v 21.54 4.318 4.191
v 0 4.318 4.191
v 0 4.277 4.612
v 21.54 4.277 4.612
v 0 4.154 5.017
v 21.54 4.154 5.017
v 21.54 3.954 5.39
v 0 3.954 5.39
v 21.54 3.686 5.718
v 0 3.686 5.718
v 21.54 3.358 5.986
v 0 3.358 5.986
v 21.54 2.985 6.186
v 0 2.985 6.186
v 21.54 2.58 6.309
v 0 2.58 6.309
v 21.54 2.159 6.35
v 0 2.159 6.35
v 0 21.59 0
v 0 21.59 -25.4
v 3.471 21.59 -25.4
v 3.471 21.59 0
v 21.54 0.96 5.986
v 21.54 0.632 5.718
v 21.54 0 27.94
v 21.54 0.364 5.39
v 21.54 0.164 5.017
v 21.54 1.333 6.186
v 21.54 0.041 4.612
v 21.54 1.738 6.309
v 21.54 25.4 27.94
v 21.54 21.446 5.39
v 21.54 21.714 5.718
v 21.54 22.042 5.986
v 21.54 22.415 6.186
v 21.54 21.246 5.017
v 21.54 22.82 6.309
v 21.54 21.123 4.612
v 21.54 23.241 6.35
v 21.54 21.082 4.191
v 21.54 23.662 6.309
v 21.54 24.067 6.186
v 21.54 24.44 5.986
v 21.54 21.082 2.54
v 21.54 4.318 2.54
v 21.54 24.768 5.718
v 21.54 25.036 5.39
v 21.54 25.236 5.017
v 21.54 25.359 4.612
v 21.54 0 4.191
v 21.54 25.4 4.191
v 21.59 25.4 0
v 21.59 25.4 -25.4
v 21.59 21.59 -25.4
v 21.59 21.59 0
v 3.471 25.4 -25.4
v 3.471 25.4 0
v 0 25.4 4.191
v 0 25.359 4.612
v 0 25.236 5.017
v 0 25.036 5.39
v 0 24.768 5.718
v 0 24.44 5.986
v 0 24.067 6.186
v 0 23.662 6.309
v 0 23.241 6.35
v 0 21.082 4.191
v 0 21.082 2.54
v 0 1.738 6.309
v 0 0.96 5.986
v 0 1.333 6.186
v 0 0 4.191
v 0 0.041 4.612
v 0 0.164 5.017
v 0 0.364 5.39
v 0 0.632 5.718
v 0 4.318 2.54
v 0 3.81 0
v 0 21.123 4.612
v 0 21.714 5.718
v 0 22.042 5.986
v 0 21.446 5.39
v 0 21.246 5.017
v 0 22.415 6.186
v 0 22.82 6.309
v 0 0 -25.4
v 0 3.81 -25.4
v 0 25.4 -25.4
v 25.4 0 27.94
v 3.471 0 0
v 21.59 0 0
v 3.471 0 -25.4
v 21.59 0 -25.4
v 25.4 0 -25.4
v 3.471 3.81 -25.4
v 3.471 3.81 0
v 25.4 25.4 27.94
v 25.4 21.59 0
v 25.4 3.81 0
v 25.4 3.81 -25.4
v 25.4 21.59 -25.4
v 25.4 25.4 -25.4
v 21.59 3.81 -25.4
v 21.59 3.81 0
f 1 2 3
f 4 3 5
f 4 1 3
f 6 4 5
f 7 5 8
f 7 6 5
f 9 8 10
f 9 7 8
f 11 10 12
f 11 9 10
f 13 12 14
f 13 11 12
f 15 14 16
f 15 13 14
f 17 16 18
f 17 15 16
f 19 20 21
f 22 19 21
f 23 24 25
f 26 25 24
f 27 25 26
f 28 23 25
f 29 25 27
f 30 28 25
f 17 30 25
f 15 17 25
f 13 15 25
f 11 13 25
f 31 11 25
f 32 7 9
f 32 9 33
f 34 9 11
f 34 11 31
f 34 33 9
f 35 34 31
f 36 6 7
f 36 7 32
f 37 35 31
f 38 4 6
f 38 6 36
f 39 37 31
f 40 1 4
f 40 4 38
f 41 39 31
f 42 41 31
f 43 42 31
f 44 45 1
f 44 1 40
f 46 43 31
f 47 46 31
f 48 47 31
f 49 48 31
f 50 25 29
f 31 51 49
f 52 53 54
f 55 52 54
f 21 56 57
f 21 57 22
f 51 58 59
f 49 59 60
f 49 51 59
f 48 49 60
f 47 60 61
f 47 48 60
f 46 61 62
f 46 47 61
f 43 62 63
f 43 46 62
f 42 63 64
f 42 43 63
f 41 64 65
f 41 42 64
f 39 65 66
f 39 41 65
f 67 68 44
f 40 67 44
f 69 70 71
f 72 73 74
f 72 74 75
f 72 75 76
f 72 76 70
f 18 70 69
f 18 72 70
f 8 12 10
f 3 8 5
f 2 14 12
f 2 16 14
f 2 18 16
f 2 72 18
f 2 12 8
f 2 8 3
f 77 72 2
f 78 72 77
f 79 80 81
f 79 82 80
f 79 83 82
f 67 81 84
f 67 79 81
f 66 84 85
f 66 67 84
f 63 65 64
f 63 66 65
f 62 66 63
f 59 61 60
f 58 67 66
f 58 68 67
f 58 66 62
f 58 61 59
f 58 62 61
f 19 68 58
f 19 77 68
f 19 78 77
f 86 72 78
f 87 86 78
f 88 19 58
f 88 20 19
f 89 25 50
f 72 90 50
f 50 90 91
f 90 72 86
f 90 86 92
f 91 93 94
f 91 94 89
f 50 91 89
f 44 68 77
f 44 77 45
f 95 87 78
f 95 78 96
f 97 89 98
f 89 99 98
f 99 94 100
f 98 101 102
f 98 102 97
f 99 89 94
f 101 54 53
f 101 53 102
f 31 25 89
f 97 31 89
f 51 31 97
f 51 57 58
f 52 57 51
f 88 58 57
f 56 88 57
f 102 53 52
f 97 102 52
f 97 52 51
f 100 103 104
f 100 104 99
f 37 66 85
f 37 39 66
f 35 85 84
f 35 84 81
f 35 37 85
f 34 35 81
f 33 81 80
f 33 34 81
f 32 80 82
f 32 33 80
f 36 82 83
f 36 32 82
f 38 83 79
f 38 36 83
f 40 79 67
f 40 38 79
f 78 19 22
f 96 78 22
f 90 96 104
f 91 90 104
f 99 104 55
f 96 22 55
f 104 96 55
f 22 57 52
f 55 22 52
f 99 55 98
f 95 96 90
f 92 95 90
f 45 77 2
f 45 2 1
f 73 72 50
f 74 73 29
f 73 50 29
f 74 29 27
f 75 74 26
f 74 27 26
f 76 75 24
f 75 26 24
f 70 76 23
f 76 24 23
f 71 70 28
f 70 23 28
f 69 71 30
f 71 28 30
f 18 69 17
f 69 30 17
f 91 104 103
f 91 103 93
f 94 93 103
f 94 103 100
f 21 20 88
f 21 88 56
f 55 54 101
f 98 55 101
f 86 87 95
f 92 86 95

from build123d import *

# Parameters (mm, degrees)
F0_W      = 25.4
F0_H      = 25.4
F1_DEPTH  = 2.54
F2_W      = 3.4710424952
F2_H      = 3.81
F2_W_2    = 3.81
F3_DEPTH  = 25.4
F4_W      = 3.8600380808
F4_H      = 25.4
F5_DEPTH  = 25.4
F6_W      = 21.5399619192
F6_H      = 4.318
F7_DEPTH  = 3.81
F8_R      = 2.15899
F9_W      = 21.5399619192
F9_H      = 4.318
F10_DEPTH = 3.81
F11_R     = 2.159
F12_R     = 2.15899


# Not quite as in the source:
# - a fillet or chamfer is up to 0.001 mm smaller than in the source, because OpenCascade refuses the exact size


with BuildPart() as f1:
    # F0 (on Top) → F1 (new body)
    with BuildSketch(Plane.XY):
        with Locations((12.7, 12.7)):
            Rectangle(F0_W, F0_H)
    extrude(amount=F1_DEPTH)

    # F2 (on face) → F3 (join)
    with BuildSketch(Plane(origin=(0, 0, 0), x_dir=(1, 0, 0), z_dir=(0, 0, -1))):
        with Locations((1.7355212476, -1.905)):
            Rectangle(F2_W, F2_H)
        with Locations((23.495, -1.905)):
            Rectangle(F2_W_2, F2_H)
        with Locations((1.7355212476, -23.495)):
            Rectangle(F2_W, F2_H)
        with Locations((23.495, -23.495)):
            Rectangle(F2_W_2, F2_H)
    extrude(amount=F3_DEPTH)

    # F4 (on face) → F5 (join)
    with BuildSketch(Plane.XY.offset(2.54)):
        with Locations((23.4699809596, 12.7)):
            Rectangle(F4_W, F4_H)
    extrude(amount=F5_DEPTH)

    # F6 (on face) → F7 (join)
    with BuildSketch(Plane.XY.offset(2.54)):
        with Locations((10.7699809596, 23.241)):
            Rectangle(F6_W, F6_H)
    extrude(amount=F7_DEPTH)

    # F8 (radius 2.159 in the source; OpenCascade refuses exactly that, so slightly less here)
    f8_edges = [f1.edges().sort_by_distance(p)[0] for p in [
        (10.769981, 25.4, 6.35),
        (10.769981, 21.082, 6.35),
    ]]
    fillet(f8_edges, radius=F8_R)

    # F9 (on face) → F10 (join)
    with BuildSketch(Plane.XY.offset(2.54)):
        with Locations((10.7699809596, 2.159)):
            Rectangle(F9_W, F9_H)
    extrude(amount=F10_DEPTH)

    # F11
    f11_edges = [f1.edges().sort_by_distance(p)[0] for p in [
        (10.769981, 0, 6.35),
    ]]
    fillet(f11_edges, radius=F11_R)

    # F12 (radius 2.159 in the source; OpenCascade refuses exactly that, so slightly less here)
    f12_edges = [f1.edges().sort_by_distance(p)[0] for p in [
        (10.769981, 4.318, 6.35),
    ]]
    fillet(f12_edges, radius=F12_R)


solid = f1.part
